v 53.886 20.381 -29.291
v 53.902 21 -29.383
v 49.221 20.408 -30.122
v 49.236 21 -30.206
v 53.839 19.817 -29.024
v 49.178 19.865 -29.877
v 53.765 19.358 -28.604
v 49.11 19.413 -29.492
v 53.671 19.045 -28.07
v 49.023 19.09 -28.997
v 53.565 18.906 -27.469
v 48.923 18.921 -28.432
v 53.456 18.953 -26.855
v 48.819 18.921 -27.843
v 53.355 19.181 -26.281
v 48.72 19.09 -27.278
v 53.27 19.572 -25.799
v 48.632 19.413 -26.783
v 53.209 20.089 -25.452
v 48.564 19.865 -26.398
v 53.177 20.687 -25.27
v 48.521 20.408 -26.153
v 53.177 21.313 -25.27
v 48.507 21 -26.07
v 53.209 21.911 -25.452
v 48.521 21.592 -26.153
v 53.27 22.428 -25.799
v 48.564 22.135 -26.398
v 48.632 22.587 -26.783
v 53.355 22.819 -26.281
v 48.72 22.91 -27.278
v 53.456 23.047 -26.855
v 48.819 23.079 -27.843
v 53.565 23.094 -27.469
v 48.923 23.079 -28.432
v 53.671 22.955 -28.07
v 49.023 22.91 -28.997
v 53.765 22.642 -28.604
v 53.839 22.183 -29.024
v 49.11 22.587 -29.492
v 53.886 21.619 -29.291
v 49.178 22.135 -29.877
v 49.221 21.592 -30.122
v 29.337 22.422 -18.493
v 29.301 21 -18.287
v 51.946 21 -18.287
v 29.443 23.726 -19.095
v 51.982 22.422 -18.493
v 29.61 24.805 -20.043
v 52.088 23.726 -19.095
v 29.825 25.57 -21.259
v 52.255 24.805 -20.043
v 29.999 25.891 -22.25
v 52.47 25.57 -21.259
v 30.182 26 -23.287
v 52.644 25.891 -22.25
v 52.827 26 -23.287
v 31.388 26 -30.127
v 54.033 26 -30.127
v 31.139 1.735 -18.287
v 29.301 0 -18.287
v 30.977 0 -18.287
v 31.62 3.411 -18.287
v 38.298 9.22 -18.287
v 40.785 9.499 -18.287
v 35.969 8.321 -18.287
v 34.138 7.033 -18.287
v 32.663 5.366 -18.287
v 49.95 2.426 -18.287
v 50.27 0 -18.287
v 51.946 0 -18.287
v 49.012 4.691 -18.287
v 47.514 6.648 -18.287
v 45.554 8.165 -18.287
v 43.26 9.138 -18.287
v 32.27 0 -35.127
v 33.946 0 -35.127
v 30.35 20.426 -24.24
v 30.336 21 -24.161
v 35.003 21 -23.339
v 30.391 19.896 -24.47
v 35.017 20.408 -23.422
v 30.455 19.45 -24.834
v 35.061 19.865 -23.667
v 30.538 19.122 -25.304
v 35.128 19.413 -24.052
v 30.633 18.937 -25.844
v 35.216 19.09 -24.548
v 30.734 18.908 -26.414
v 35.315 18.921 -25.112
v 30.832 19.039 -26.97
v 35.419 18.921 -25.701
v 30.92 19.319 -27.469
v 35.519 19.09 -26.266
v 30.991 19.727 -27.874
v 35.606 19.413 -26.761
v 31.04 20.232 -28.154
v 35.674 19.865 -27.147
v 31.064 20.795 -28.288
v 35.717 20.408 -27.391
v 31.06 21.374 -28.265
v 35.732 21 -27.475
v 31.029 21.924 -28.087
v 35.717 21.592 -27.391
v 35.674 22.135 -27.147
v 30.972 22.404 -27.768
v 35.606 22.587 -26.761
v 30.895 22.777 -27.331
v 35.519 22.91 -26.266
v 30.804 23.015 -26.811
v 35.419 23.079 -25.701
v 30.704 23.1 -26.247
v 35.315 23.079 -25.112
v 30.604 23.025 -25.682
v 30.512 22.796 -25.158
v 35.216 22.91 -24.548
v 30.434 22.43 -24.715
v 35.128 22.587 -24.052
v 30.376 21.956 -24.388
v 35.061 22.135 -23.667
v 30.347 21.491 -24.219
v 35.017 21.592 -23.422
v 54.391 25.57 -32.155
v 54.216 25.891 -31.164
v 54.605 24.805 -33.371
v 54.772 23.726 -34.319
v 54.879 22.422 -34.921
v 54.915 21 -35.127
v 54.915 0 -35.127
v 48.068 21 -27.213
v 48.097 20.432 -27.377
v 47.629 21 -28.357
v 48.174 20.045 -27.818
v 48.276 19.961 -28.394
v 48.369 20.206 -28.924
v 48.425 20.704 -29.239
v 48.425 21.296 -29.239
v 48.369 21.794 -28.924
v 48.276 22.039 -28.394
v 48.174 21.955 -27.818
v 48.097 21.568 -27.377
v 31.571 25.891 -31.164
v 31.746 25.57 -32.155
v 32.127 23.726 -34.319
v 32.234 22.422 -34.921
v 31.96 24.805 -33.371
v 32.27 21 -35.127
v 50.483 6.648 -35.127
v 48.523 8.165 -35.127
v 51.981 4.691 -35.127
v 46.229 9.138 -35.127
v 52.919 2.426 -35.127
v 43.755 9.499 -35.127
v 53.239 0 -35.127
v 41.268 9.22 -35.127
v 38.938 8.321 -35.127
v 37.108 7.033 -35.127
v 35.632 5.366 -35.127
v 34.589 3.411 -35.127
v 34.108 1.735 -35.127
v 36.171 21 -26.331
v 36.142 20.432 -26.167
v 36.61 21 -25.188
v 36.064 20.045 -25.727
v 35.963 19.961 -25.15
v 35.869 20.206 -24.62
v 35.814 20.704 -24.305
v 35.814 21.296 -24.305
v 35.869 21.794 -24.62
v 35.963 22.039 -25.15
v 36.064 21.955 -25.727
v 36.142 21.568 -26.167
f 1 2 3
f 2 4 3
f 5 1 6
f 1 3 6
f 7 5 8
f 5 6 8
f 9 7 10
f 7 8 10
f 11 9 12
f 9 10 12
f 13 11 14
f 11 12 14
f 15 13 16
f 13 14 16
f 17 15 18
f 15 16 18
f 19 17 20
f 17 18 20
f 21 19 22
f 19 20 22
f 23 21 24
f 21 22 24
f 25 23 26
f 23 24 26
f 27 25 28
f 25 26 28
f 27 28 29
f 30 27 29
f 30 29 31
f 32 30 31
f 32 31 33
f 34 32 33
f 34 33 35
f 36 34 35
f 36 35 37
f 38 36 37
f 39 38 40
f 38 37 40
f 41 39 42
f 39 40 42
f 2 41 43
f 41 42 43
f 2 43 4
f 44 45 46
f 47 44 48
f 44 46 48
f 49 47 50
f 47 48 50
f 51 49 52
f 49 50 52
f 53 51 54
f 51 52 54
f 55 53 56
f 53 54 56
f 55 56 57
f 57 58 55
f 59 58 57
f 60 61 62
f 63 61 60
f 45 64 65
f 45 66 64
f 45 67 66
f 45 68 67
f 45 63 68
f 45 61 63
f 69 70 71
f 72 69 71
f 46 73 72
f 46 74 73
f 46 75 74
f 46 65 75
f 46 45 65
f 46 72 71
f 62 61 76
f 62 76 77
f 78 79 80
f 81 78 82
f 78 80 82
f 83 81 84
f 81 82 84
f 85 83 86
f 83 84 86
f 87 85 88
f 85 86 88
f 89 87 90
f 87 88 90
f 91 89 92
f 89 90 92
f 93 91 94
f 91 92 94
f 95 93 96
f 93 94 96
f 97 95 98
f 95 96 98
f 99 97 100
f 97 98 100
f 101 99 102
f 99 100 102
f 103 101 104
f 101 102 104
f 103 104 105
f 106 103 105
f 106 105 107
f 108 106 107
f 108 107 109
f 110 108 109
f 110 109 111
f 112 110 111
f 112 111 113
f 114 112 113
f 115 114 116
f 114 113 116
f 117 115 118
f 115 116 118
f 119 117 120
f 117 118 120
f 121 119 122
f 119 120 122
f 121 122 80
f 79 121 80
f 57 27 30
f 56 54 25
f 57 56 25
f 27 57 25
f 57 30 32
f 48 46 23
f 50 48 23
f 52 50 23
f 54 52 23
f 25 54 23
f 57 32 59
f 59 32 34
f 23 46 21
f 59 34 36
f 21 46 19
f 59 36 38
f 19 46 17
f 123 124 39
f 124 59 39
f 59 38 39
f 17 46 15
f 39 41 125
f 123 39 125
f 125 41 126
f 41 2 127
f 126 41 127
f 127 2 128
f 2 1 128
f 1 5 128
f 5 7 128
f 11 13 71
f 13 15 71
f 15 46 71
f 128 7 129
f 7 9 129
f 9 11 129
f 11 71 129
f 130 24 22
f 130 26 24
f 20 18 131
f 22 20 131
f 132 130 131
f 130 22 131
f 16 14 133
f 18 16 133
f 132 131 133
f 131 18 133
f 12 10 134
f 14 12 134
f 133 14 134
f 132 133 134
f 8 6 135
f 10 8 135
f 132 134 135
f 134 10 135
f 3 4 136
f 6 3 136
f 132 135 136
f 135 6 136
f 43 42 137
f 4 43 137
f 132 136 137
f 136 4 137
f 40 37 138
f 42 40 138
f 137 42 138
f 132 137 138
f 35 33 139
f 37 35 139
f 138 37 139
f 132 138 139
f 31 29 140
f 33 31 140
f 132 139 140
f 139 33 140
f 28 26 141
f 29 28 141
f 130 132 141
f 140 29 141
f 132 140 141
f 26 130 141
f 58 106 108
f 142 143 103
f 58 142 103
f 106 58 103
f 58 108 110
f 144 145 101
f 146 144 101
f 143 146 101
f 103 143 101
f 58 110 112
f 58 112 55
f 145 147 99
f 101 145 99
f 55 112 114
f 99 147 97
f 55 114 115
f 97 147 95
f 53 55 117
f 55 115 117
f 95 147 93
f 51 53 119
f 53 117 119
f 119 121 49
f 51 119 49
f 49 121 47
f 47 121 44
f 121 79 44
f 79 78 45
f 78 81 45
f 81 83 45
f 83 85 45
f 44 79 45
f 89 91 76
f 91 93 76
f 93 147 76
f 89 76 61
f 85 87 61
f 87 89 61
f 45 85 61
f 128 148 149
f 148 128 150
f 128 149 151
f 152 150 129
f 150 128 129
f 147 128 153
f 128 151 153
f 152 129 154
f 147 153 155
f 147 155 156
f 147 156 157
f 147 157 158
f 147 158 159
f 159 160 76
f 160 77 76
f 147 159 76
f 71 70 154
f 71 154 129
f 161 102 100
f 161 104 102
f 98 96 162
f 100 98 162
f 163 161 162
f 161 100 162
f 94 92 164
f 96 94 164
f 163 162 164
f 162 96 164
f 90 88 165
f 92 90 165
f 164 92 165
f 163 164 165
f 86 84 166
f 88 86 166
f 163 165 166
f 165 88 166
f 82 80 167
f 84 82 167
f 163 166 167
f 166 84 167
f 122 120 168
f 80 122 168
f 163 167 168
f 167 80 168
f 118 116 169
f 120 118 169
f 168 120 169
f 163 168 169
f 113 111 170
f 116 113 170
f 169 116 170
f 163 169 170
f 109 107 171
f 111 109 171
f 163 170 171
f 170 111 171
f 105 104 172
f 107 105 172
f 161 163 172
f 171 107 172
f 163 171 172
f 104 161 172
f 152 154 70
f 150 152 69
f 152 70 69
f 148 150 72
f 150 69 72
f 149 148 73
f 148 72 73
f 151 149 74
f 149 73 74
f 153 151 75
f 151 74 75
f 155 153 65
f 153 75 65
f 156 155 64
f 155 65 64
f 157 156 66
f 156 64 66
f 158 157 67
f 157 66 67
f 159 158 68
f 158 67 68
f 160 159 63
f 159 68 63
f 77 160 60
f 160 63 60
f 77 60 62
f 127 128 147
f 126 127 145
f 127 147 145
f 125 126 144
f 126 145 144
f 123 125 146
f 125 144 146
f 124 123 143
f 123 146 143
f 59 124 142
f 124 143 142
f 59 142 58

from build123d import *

# Parameters (mm, degrees)
BOSS_EXTRUDE2_DEPTH             = 26
CUT_EXTRUDE7_DEPTH              = 71.182431461
CUT_EXTRUDE8_DEPTH              = 59.485252348
FILLET6_R                       = 5
M5_TAPPED_HOLE1_D               = 4.2
M5_TAPPED_HOLE1_DEPTH           = 4.7381927
M5_TAPPED_HOLE1_TIP             = 1.2618073
M5_TAPPED_HOLE1_ON_FACE_2_D     = 4.2
M5_TAPPED_HOLE1_ON_FACE_2_DEPTH = 4.7381927
M5_TAPPED_HOLE1_ON_FACE_2_TIP   = 1.2618073


with BuildPart() as part:
    # 草图1 → Boss-Extrude2 (new body)
    with BuildSketch(Plane(origin=(0, 0, 0), x_dir=(1, 0, 0), z_dir=(0, 1, 0))):
        Polygon((29.300589914, 18.286975519), (51.945589914, 18.286975519), (54.914973752, 35.127188096), (32.269973752, 35.127188096), align=None)
        Polygon((29.300589914, 18.286975519), (51.945589914, 18.286975519), (51.262759613, 14.414452446), align=None)
    extrude(amount=BOSS_EXTRUDE2_DEPTH)

    # Sketch3 → Cut-Extrude7 (cut, through all)
    with BuildSketch(Plane(origin=(0, 26, 0), x_dir=(1, 0, 0), z_dir=(0, 1, 0))):
        Polygon((29.300589914, 18.286975519), (51.945589914, 18.286975519), (51.262759613, 14.414452446), align=None)
    extrude(amount=-CUT_EXTRUDE7_DEPTH, mode=Mode.SUBTRACT)

    # Sketch2 → Cut-Extrude8 (cut, through all)
    with BuildSketch(Plane(origin=(4.010777888, 0, -22.746251717), x_dir=(0.984807753012208, 0, 0.17364817766693091), z_dir=(-0.17364817766693091, 0, 0.984807753012208))):
        with BuildLine():
            Line((27.330433925, 0), (46.330433925, 0))
            ThreePointArc((46.330433925, 0), (36.830433925, 9.5), (27.330433925, 0))
        make_face()
    extrude(amount=-CUT_EXTRUDE8_DEPTH, mode=Mode.SUBTRACT)

    # Fillet6
    fillet6_edges = [part.edges().sort_by_distance(p)[0] for p in [
        (40.623089914, 26, -18.286975519),
        (43.592473752, 26, -35.127188096),
    ]]
    fillet(fillet6_edges, radius=FILLET6_R)

    # M5 Tapped Hole1
    with Locations(Plane(origin=(53.537445864, 21, -27.314839229), x_dir=(-0.173648177667, 0, 0.984807753012), z_dir=(0.984807753012, 0, 0.173648177667))):
        with Locations((0, 0)):
            Hole(M5_TAPPED_HOLE1_D / 2, depth=M5_TAPPED_HOLE1_DEPTH)
            with Locations((0, 0, -(M5_TAPPED_HOLE1_DEPTH + M5_TAPPED_HOLE1_TIP / 2))):  # 118° drill point
                Cone(0, M5_TAPPED_HOLE1_D / 2, M5_TAPPED_HOLE1_TIP, mode=Mode.SUBTRACT)

    # M5 Tapped Hole1 on face 2
    with Locations(Plane(origin=(30.701085573, 21, -26.229581085), x_dir=(0.17364796312, 0, -0.984807790843), z_dir=(-0.984807790843, 0, -0.17364796312))):
        with Locations((0, 0)):
            Hole(M5_TAPPED_HOLE1_ON_FACE_2_D / 2, depth=M5_TAPPED_HOLE1_ON_FACE_2_DEPTH)
            with Locations((0, 0, -(M5_TAPPED_HOLE1_ON_FACE_2_DEPTH + M5_TAPPED_HOLE1_ON_FACE_2_TIP / 2))):  # 118° drill point
                Cone(0, M5_TAPPED_HOLE1_ON_FACE_2_D / 2, M5_TAPPED_HOLE1_ON_FACE_2_TIP, mode=Mode.SUBTRACT)


solid = part.part
